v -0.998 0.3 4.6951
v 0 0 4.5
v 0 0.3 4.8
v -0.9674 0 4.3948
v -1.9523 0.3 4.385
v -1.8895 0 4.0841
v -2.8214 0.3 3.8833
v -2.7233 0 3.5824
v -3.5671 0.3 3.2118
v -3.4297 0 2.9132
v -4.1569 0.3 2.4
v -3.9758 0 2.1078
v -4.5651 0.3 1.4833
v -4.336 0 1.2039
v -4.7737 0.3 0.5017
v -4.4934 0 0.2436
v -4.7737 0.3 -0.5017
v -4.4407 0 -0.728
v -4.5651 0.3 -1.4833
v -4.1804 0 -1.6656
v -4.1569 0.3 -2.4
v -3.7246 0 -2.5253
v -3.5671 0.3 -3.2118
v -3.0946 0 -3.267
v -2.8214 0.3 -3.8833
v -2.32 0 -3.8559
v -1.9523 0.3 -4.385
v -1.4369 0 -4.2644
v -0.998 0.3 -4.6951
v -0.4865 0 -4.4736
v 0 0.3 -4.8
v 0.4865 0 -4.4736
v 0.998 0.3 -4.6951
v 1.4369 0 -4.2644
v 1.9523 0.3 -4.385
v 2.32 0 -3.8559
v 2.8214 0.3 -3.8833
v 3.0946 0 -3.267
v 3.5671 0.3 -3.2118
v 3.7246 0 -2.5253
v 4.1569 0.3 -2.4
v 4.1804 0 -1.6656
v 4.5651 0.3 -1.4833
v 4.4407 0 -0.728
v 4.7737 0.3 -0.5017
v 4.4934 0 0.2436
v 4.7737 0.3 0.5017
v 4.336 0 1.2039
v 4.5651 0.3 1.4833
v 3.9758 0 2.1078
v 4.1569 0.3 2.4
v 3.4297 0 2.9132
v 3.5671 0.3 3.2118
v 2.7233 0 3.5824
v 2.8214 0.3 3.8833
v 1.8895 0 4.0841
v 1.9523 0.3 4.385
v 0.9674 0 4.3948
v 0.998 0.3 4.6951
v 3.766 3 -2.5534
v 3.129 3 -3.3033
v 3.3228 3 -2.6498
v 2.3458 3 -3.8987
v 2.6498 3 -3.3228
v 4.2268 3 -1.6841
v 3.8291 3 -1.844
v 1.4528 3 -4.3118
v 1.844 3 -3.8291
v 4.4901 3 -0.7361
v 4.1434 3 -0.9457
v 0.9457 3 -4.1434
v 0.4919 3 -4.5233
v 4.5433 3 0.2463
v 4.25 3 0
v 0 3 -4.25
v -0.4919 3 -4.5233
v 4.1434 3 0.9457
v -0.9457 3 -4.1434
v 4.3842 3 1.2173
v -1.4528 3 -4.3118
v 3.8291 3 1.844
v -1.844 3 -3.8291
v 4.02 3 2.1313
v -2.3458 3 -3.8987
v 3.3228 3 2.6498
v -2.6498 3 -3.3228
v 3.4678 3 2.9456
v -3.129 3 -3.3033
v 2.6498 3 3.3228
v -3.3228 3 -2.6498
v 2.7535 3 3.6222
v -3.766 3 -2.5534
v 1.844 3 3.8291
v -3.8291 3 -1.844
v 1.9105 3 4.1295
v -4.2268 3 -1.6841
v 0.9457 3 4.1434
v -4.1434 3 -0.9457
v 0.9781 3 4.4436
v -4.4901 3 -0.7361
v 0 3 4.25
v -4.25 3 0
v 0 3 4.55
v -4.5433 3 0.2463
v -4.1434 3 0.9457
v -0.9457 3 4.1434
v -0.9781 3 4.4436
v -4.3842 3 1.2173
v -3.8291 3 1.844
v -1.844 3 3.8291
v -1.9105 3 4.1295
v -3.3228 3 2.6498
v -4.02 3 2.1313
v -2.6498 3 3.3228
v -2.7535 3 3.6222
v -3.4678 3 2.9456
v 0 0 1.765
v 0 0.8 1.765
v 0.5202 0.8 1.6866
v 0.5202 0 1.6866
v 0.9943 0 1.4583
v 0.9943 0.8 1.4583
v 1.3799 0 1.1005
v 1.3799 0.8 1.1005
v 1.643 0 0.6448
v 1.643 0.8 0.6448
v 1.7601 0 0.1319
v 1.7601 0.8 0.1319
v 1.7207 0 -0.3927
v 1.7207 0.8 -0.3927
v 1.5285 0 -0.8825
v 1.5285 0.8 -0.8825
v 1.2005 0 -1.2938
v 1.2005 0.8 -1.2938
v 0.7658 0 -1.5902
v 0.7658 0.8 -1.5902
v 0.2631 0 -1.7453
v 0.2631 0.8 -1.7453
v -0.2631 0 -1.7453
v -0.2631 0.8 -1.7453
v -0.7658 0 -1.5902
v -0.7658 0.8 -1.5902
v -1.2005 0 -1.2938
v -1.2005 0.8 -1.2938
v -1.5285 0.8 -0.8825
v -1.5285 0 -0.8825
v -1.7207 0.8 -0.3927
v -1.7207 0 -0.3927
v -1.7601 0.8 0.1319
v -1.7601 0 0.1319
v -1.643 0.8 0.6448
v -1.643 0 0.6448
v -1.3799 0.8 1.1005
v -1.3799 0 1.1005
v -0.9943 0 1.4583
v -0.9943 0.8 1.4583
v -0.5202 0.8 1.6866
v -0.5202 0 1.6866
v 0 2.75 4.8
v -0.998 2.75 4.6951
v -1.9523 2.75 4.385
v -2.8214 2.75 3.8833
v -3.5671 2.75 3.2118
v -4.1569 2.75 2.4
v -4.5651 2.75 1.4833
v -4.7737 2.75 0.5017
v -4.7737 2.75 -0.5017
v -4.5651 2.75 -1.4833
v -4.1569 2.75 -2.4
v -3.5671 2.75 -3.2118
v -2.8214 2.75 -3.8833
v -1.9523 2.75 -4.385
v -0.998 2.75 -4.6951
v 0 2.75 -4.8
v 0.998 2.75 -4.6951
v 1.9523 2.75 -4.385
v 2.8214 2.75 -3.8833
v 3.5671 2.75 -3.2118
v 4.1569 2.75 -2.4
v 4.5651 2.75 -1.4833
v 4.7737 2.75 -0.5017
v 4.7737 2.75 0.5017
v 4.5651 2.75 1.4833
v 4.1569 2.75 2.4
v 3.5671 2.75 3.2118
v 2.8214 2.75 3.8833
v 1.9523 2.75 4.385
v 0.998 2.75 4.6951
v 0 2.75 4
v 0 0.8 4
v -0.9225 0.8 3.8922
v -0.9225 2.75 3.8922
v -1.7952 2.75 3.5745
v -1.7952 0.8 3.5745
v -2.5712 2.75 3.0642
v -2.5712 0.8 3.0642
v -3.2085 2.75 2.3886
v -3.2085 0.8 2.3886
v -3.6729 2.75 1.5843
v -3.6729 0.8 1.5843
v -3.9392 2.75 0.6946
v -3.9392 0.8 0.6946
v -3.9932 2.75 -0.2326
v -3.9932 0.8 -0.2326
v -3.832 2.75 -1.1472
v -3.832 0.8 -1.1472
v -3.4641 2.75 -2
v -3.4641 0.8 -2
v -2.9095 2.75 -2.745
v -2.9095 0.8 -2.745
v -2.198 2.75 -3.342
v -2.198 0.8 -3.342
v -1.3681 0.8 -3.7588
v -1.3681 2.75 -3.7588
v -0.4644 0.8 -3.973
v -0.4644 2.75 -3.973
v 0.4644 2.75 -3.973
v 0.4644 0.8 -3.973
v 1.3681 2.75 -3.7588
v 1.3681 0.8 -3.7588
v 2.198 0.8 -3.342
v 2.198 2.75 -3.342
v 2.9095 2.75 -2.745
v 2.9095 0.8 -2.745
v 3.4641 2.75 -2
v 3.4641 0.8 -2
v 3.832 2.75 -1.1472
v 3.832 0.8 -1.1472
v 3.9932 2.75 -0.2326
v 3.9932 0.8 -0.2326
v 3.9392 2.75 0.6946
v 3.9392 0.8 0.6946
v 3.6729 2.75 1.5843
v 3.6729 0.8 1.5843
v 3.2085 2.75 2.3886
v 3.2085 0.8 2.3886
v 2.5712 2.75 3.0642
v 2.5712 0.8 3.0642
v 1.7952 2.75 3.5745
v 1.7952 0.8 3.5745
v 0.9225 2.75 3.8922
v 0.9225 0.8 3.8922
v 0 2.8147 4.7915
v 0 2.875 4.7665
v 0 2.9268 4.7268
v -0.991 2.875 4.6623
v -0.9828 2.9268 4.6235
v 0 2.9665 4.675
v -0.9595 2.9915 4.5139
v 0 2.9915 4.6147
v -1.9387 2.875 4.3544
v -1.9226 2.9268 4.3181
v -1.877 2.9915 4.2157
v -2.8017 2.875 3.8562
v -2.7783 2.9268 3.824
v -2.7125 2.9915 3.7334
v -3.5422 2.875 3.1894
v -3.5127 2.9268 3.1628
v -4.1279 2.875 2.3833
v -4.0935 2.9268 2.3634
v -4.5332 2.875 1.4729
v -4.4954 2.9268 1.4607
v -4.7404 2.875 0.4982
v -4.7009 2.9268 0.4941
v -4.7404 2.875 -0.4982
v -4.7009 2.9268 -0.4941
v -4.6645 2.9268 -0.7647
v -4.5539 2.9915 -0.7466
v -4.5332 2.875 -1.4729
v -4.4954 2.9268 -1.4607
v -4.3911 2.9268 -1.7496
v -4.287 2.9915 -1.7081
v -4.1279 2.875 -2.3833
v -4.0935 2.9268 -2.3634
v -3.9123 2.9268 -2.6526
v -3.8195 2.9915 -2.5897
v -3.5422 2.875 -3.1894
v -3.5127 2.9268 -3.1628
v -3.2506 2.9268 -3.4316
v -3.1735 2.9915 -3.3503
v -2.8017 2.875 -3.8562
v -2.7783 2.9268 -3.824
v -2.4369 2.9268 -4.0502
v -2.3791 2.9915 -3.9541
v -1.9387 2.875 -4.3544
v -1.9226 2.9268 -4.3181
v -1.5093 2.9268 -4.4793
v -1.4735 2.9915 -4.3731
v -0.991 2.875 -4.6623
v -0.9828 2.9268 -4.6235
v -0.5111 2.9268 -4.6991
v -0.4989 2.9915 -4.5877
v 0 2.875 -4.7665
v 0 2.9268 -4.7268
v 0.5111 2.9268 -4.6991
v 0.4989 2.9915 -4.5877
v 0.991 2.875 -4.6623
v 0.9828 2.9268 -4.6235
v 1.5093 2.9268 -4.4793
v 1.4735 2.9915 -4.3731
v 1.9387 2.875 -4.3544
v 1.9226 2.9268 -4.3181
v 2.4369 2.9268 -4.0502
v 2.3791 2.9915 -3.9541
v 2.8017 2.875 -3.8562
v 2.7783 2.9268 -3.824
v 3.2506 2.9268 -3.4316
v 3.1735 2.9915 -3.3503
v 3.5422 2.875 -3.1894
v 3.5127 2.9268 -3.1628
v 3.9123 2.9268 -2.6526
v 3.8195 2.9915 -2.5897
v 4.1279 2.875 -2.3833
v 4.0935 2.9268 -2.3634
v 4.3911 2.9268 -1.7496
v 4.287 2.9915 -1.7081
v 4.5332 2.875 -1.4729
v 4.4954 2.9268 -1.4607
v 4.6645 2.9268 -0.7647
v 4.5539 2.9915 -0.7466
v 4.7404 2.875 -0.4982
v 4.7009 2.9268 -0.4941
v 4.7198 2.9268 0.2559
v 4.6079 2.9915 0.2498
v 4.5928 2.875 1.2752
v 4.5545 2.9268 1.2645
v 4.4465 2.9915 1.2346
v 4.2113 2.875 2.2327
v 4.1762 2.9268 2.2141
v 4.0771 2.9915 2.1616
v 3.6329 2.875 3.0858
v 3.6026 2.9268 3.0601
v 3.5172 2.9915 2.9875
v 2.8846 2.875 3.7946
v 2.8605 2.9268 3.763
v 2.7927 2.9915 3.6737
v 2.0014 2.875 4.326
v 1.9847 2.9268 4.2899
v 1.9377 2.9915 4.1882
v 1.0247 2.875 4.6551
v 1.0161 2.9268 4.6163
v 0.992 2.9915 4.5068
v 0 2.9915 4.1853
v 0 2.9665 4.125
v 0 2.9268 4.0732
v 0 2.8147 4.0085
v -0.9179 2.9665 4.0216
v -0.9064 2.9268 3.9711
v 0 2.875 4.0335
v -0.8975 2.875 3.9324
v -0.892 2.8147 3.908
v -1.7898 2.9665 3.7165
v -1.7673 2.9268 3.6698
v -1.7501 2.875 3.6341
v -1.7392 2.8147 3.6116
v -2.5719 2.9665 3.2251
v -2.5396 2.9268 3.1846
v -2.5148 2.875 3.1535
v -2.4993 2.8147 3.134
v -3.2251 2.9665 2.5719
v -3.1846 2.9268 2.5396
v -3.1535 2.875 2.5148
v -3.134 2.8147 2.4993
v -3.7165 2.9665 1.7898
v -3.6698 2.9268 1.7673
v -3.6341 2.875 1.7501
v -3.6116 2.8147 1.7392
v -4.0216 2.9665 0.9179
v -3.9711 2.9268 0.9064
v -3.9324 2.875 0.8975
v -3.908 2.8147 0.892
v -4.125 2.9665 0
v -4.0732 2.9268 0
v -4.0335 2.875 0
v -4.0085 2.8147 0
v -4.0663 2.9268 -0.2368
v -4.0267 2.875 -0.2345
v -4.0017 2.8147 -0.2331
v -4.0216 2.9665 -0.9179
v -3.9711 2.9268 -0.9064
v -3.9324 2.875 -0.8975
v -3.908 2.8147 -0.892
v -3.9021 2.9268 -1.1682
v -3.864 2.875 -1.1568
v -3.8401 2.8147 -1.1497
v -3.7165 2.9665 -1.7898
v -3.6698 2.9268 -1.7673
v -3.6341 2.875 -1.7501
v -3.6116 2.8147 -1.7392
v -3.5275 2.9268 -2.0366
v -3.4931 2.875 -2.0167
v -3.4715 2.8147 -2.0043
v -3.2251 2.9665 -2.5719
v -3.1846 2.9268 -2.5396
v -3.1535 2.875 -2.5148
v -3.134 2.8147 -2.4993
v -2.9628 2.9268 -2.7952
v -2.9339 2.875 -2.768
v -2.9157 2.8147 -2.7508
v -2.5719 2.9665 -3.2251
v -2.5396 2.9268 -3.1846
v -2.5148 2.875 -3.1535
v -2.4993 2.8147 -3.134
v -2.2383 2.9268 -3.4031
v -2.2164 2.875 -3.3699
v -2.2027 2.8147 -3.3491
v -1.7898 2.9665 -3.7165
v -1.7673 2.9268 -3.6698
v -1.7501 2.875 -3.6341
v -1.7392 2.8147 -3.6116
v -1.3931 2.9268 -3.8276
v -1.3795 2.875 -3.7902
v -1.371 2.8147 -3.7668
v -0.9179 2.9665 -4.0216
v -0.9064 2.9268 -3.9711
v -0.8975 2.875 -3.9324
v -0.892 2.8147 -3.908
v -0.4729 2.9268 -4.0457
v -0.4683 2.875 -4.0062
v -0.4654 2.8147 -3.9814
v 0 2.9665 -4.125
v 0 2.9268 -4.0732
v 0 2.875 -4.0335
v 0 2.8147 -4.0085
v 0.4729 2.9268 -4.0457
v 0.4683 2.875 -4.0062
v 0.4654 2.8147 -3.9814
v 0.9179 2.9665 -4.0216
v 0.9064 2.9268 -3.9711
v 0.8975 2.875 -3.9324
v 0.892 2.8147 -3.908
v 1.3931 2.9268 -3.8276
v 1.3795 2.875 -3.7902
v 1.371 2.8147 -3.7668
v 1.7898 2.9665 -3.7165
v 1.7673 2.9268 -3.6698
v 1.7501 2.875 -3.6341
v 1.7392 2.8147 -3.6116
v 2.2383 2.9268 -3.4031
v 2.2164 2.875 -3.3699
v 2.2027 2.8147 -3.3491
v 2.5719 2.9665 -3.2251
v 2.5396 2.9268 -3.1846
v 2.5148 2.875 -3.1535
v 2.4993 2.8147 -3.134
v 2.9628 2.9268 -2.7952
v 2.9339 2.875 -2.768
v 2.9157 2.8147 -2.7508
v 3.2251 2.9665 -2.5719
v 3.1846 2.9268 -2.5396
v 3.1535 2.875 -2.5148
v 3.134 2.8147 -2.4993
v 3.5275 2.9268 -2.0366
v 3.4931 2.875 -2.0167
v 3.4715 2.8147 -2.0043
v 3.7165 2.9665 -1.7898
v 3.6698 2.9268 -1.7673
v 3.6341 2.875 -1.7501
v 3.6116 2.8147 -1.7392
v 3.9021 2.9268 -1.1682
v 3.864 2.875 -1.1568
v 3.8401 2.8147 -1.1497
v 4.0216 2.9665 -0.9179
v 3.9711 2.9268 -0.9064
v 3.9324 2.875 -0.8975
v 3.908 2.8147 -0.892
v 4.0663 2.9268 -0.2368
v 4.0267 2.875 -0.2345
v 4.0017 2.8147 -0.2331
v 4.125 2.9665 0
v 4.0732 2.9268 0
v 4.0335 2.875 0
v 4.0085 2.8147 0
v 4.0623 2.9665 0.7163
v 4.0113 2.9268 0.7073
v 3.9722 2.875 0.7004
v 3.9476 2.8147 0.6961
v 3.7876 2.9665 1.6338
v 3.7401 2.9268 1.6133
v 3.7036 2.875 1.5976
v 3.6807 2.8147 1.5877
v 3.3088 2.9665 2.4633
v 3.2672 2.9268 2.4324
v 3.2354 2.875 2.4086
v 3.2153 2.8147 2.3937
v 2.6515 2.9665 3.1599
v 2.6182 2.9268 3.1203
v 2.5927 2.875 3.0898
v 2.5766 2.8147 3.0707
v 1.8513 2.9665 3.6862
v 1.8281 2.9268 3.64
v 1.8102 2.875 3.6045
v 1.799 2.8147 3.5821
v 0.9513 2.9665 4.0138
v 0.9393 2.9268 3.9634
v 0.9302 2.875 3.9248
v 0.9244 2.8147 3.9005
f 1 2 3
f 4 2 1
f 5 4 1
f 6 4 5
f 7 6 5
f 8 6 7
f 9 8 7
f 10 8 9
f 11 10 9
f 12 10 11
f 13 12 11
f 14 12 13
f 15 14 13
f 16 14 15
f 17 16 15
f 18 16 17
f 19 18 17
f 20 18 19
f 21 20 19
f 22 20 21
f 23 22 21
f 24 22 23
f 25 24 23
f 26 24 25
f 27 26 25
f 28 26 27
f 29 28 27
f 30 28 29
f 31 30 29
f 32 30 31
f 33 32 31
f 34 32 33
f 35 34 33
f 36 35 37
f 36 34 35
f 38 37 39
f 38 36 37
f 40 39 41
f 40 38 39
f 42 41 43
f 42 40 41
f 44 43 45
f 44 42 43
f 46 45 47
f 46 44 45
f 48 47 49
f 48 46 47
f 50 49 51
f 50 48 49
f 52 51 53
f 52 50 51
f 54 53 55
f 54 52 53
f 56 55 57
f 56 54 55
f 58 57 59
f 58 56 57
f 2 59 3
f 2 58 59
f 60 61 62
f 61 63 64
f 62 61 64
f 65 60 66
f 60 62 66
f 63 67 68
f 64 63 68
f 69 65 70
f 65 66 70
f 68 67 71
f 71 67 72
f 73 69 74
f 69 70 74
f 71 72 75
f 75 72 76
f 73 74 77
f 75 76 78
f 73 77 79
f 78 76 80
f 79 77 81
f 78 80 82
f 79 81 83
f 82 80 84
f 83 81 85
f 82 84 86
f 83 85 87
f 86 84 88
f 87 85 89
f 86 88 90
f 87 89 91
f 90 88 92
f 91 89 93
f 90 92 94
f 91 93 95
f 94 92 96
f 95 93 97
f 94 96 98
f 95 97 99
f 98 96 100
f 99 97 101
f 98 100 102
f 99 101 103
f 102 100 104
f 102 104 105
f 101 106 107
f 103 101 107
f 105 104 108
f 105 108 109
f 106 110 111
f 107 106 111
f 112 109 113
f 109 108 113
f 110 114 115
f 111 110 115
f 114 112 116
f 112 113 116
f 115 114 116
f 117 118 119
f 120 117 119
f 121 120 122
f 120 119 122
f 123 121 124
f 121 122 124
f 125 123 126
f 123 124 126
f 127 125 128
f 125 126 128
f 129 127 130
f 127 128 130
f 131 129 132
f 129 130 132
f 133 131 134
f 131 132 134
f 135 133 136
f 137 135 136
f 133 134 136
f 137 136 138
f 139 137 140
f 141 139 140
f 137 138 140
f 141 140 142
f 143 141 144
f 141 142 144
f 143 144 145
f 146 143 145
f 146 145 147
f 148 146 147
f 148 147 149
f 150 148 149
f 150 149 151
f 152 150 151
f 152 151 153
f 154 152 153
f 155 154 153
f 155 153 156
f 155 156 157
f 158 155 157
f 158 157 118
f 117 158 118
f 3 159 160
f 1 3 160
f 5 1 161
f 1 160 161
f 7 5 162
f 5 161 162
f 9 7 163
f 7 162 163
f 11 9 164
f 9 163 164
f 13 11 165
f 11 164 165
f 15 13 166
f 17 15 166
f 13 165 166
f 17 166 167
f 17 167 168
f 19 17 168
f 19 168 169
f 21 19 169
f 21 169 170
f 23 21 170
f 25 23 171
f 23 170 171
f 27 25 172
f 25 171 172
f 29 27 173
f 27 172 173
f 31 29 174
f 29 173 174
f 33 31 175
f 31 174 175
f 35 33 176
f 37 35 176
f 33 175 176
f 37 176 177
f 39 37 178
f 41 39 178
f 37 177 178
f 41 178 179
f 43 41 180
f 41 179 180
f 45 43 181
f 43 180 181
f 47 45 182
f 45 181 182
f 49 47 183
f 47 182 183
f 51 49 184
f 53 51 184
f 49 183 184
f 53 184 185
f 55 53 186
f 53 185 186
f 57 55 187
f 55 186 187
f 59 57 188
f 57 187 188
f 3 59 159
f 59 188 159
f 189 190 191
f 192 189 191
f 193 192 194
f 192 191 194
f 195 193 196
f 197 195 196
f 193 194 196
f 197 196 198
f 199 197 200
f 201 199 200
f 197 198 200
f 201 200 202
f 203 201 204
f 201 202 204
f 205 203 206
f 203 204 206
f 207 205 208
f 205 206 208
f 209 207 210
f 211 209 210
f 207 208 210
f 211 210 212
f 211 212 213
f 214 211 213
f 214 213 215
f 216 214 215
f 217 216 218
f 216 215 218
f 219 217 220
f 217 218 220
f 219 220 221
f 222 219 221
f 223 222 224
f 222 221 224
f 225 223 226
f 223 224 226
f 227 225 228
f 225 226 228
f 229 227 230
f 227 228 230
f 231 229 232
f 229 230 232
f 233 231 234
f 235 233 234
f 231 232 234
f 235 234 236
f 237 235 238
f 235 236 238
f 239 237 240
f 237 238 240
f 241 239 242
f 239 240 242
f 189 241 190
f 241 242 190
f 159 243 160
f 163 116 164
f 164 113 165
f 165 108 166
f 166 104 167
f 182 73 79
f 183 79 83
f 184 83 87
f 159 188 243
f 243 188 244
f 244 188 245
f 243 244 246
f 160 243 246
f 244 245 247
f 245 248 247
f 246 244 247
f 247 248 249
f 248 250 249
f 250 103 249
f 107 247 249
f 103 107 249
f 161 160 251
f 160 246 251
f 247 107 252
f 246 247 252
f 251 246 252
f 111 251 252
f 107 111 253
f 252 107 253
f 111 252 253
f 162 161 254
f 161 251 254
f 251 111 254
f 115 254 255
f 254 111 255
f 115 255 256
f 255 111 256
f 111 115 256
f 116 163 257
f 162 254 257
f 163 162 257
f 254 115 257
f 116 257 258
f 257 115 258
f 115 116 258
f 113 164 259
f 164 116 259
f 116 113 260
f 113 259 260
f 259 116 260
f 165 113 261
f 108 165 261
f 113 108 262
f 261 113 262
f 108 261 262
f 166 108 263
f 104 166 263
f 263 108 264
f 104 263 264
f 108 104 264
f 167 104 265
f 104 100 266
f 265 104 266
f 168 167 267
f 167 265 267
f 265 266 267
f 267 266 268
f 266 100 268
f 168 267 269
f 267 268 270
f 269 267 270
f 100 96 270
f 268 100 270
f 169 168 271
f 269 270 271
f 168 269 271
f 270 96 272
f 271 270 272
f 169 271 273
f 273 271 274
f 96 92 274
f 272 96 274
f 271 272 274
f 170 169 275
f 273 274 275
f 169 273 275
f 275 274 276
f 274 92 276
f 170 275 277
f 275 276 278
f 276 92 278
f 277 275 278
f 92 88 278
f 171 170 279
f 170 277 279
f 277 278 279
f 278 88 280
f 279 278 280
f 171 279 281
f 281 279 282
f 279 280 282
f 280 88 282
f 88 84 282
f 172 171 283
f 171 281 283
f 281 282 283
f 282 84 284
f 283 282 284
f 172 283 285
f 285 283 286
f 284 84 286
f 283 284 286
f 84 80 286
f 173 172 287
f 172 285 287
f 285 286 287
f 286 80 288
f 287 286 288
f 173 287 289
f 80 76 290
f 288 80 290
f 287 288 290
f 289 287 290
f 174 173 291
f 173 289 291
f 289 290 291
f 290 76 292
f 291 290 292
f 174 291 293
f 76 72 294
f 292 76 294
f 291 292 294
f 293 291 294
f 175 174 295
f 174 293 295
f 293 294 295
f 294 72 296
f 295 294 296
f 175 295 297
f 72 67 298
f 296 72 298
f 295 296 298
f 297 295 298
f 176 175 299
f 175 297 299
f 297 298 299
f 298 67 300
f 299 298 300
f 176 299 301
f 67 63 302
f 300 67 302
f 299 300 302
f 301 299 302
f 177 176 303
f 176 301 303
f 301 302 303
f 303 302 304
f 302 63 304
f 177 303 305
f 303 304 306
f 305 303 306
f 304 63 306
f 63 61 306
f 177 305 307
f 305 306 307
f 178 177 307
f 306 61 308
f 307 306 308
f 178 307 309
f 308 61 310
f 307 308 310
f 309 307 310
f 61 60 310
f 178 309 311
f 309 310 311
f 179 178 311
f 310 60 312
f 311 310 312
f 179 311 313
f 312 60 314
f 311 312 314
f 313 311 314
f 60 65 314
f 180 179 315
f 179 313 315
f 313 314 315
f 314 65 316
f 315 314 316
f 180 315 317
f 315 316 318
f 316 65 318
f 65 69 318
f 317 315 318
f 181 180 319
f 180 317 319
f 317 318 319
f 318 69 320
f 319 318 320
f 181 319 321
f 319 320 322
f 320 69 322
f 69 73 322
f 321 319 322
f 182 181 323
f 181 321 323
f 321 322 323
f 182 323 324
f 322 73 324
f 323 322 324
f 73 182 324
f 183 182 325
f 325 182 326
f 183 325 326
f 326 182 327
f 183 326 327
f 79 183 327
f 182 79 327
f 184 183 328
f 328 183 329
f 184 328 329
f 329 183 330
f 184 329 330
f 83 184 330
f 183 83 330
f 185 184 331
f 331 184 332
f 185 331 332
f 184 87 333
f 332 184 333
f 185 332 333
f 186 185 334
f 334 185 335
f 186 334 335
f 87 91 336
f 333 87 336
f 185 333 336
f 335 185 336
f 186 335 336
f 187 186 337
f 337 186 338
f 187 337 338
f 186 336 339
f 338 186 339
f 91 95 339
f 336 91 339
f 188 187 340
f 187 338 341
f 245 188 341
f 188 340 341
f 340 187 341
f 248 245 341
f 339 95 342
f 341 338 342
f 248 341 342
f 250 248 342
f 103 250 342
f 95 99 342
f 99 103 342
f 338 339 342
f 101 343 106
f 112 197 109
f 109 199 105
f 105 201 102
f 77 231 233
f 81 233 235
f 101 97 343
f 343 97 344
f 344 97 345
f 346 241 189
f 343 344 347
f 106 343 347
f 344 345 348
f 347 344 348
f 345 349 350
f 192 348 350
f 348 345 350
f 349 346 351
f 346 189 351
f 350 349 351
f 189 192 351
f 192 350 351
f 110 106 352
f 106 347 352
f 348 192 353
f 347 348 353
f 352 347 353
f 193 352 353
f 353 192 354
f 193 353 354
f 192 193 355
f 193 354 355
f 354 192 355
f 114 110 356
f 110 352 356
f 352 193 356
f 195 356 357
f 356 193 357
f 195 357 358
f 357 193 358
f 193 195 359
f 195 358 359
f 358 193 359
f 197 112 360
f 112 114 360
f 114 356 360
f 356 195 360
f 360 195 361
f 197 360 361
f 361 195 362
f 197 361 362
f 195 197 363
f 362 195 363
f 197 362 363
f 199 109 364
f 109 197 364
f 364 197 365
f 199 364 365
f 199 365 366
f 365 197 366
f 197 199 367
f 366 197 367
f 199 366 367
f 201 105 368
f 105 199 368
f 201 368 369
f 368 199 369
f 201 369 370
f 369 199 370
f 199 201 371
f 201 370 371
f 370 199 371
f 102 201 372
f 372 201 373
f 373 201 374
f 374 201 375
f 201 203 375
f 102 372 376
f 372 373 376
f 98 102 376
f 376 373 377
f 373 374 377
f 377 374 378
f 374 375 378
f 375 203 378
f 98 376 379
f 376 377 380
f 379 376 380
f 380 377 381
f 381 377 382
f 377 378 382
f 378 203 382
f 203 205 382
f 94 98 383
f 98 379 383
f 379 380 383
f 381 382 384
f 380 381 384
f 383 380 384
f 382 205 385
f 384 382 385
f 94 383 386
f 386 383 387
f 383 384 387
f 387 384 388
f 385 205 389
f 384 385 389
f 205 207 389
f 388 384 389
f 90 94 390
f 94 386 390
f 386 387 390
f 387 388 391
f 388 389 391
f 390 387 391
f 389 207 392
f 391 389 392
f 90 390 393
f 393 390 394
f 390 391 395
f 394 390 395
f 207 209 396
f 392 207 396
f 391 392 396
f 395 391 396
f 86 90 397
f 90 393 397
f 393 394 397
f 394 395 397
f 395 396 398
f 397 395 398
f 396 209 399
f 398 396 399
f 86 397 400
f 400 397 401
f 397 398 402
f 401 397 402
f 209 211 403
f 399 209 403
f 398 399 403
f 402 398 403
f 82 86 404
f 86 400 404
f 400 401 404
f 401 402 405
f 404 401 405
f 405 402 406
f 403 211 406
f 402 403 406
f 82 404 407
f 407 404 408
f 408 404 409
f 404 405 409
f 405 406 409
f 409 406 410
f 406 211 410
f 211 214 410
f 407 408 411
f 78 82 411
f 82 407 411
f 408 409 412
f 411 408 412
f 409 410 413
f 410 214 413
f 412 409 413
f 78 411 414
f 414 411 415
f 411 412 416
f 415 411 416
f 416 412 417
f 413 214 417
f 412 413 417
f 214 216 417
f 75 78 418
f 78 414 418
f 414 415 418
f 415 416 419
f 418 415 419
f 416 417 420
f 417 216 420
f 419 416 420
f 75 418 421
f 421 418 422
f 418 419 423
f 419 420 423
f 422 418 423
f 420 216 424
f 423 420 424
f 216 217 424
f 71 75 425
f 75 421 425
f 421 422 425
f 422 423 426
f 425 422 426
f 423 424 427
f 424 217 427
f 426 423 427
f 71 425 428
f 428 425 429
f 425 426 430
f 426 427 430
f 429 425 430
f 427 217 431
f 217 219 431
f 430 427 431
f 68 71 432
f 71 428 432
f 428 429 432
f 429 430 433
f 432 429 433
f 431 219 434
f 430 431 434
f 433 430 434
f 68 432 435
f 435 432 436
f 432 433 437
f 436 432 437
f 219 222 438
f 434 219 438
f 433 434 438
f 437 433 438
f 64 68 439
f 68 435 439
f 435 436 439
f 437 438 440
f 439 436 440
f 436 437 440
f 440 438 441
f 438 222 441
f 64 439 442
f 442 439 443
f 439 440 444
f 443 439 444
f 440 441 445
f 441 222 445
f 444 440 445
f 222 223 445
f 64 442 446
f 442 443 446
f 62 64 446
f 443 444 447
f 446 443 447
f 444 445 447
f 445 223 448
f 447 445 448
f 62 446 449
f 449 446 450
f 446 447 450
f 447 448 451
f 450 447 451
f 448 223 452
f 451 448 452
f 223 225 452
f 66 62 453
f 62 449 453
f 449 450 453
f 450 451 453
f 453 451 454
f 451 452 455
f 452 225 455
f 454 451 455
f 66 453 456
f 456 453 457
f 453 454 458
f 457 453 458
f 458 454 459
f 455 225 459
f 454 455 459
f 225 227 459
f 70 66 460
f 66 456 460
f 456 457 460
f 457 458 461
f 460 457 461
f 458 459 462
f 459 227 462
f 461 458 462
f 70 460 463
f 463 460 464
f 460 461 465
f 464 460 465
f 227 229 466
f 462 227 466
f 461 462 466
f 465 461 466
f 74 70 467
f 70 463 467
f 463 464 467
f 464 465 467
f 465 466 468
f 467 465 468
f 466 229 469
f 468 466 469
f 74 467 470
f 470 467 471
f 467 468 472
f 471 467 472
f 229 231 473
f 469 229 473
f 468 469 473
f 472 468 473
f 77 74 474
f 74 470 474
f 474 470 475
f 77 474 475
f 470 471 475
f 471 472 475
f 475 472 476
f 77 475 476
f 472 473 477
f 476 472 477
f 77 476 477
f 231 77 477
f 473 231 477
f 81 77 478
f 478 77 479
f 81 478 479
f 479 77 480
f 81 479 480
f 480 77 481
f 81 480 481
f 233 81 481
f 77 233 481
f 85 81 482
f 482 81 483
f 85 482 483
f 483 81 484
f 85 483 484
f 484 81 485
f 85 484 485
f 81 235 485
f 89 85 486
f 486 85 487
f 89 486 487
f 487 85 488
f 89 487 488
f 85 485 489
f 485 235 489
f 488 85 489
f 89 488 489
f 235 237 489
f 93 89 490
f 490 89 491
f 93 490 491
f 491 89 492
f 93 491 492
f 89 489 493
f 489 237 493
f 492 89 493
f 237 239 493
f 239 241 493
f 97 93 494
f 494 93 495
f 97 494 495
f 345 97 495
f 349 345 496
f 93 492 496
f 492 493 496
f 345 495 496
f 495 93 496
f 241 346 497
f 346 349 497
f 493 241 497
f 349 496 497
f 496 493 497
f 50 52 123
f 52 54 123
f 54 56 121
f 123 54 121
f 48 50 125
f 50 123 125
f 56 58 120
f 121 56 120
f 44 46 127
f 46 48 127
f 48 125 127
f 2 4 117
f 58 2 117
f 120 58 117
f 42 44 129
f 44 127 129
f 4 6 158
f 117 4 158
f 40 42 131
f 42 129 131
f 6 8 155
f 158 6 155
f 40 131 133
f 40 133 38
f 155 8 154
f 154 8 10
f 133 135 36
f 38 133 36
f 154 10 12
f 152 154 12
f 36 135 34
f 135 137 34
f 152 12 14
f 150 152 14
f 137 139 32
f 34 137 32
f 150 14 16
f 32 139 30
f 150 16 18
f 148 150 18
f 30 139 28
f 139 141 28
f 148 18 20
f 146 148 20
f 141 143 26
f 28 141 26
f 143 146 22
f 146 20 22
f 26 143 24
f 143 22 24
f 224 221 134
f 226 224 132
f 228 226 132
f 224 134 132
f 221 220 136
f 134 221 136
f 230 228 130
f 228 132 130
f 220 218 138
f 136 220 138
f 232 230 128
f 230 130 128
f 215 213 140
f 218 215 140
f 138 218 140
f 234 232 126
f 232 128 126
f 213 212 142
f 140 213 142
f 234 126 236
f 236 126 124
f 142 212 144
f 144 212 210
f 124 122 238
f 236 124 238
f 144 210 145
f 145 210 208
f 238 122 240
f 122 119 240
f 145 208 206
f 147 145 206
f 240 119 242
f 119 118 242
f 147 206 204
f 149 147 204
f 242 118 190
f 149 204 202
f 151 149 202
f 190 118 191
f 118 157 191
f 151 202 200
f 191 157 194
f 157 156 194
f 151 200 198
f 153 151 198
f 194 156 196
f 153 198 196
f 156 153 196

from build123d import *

# Parameters (mm, degrees)
SKETCH2_R          = 1.765
CUT_EXTRUDE1_DEPTH = 8.13582511
FILLET1_R          = 0.25
CHAMFER1_SIZE      = 0.3


with BuildPart() as part:
    # Sketch1 → Revolve1 (revolve)
    with BuildSketch(Plane.XY, mode=Mode.PRIVATE) as revolve1_sk:
        Polygon((0, 0), (4.8, 0), (4.8, 3), (4, 3), (4, 0.8), (0, 0.8), align=None)
    revolve(revolve1_sk.sketch.rotate(Axis((0, 0.8, 0), (0, -1, 0)), 90), axis=Axis((0, 0.8, 0), (0, -1, 0)))

    # Sketch2 → Cut-Extrude1 (cut, through all)
    with BuildSketch(Plane(origin=(0, 0.8, 0), x_dir=(1, 0, 0), z_dir=(0, 1, 0))):
        with Locations(Location((0, 0, 0), (0, 0, 270))):
            Circle(SKETCH2_R)
    extrude(amount=-CUT_EXTRUDE1_DEPTH, mode=Mode.SUBTRACT)

    # Fillet1
    fillet1_edges = [part.edges().sort_by_distance(p)[0] for p in [
        (0, 3, -4),
        (0, 3, -4.8),
    ]]
    fillet(fillet1_edges, radius=FILLET1_R)

    # Chamfer1
    chamfer1_edges = [part.edges().sort_by_distance(p)[0] for p in [
        (0, 0, -4.8),
    ]]
    chamfer(chamfer1_edges, length=CHAMFER1_SIZE)


solid = part.part
